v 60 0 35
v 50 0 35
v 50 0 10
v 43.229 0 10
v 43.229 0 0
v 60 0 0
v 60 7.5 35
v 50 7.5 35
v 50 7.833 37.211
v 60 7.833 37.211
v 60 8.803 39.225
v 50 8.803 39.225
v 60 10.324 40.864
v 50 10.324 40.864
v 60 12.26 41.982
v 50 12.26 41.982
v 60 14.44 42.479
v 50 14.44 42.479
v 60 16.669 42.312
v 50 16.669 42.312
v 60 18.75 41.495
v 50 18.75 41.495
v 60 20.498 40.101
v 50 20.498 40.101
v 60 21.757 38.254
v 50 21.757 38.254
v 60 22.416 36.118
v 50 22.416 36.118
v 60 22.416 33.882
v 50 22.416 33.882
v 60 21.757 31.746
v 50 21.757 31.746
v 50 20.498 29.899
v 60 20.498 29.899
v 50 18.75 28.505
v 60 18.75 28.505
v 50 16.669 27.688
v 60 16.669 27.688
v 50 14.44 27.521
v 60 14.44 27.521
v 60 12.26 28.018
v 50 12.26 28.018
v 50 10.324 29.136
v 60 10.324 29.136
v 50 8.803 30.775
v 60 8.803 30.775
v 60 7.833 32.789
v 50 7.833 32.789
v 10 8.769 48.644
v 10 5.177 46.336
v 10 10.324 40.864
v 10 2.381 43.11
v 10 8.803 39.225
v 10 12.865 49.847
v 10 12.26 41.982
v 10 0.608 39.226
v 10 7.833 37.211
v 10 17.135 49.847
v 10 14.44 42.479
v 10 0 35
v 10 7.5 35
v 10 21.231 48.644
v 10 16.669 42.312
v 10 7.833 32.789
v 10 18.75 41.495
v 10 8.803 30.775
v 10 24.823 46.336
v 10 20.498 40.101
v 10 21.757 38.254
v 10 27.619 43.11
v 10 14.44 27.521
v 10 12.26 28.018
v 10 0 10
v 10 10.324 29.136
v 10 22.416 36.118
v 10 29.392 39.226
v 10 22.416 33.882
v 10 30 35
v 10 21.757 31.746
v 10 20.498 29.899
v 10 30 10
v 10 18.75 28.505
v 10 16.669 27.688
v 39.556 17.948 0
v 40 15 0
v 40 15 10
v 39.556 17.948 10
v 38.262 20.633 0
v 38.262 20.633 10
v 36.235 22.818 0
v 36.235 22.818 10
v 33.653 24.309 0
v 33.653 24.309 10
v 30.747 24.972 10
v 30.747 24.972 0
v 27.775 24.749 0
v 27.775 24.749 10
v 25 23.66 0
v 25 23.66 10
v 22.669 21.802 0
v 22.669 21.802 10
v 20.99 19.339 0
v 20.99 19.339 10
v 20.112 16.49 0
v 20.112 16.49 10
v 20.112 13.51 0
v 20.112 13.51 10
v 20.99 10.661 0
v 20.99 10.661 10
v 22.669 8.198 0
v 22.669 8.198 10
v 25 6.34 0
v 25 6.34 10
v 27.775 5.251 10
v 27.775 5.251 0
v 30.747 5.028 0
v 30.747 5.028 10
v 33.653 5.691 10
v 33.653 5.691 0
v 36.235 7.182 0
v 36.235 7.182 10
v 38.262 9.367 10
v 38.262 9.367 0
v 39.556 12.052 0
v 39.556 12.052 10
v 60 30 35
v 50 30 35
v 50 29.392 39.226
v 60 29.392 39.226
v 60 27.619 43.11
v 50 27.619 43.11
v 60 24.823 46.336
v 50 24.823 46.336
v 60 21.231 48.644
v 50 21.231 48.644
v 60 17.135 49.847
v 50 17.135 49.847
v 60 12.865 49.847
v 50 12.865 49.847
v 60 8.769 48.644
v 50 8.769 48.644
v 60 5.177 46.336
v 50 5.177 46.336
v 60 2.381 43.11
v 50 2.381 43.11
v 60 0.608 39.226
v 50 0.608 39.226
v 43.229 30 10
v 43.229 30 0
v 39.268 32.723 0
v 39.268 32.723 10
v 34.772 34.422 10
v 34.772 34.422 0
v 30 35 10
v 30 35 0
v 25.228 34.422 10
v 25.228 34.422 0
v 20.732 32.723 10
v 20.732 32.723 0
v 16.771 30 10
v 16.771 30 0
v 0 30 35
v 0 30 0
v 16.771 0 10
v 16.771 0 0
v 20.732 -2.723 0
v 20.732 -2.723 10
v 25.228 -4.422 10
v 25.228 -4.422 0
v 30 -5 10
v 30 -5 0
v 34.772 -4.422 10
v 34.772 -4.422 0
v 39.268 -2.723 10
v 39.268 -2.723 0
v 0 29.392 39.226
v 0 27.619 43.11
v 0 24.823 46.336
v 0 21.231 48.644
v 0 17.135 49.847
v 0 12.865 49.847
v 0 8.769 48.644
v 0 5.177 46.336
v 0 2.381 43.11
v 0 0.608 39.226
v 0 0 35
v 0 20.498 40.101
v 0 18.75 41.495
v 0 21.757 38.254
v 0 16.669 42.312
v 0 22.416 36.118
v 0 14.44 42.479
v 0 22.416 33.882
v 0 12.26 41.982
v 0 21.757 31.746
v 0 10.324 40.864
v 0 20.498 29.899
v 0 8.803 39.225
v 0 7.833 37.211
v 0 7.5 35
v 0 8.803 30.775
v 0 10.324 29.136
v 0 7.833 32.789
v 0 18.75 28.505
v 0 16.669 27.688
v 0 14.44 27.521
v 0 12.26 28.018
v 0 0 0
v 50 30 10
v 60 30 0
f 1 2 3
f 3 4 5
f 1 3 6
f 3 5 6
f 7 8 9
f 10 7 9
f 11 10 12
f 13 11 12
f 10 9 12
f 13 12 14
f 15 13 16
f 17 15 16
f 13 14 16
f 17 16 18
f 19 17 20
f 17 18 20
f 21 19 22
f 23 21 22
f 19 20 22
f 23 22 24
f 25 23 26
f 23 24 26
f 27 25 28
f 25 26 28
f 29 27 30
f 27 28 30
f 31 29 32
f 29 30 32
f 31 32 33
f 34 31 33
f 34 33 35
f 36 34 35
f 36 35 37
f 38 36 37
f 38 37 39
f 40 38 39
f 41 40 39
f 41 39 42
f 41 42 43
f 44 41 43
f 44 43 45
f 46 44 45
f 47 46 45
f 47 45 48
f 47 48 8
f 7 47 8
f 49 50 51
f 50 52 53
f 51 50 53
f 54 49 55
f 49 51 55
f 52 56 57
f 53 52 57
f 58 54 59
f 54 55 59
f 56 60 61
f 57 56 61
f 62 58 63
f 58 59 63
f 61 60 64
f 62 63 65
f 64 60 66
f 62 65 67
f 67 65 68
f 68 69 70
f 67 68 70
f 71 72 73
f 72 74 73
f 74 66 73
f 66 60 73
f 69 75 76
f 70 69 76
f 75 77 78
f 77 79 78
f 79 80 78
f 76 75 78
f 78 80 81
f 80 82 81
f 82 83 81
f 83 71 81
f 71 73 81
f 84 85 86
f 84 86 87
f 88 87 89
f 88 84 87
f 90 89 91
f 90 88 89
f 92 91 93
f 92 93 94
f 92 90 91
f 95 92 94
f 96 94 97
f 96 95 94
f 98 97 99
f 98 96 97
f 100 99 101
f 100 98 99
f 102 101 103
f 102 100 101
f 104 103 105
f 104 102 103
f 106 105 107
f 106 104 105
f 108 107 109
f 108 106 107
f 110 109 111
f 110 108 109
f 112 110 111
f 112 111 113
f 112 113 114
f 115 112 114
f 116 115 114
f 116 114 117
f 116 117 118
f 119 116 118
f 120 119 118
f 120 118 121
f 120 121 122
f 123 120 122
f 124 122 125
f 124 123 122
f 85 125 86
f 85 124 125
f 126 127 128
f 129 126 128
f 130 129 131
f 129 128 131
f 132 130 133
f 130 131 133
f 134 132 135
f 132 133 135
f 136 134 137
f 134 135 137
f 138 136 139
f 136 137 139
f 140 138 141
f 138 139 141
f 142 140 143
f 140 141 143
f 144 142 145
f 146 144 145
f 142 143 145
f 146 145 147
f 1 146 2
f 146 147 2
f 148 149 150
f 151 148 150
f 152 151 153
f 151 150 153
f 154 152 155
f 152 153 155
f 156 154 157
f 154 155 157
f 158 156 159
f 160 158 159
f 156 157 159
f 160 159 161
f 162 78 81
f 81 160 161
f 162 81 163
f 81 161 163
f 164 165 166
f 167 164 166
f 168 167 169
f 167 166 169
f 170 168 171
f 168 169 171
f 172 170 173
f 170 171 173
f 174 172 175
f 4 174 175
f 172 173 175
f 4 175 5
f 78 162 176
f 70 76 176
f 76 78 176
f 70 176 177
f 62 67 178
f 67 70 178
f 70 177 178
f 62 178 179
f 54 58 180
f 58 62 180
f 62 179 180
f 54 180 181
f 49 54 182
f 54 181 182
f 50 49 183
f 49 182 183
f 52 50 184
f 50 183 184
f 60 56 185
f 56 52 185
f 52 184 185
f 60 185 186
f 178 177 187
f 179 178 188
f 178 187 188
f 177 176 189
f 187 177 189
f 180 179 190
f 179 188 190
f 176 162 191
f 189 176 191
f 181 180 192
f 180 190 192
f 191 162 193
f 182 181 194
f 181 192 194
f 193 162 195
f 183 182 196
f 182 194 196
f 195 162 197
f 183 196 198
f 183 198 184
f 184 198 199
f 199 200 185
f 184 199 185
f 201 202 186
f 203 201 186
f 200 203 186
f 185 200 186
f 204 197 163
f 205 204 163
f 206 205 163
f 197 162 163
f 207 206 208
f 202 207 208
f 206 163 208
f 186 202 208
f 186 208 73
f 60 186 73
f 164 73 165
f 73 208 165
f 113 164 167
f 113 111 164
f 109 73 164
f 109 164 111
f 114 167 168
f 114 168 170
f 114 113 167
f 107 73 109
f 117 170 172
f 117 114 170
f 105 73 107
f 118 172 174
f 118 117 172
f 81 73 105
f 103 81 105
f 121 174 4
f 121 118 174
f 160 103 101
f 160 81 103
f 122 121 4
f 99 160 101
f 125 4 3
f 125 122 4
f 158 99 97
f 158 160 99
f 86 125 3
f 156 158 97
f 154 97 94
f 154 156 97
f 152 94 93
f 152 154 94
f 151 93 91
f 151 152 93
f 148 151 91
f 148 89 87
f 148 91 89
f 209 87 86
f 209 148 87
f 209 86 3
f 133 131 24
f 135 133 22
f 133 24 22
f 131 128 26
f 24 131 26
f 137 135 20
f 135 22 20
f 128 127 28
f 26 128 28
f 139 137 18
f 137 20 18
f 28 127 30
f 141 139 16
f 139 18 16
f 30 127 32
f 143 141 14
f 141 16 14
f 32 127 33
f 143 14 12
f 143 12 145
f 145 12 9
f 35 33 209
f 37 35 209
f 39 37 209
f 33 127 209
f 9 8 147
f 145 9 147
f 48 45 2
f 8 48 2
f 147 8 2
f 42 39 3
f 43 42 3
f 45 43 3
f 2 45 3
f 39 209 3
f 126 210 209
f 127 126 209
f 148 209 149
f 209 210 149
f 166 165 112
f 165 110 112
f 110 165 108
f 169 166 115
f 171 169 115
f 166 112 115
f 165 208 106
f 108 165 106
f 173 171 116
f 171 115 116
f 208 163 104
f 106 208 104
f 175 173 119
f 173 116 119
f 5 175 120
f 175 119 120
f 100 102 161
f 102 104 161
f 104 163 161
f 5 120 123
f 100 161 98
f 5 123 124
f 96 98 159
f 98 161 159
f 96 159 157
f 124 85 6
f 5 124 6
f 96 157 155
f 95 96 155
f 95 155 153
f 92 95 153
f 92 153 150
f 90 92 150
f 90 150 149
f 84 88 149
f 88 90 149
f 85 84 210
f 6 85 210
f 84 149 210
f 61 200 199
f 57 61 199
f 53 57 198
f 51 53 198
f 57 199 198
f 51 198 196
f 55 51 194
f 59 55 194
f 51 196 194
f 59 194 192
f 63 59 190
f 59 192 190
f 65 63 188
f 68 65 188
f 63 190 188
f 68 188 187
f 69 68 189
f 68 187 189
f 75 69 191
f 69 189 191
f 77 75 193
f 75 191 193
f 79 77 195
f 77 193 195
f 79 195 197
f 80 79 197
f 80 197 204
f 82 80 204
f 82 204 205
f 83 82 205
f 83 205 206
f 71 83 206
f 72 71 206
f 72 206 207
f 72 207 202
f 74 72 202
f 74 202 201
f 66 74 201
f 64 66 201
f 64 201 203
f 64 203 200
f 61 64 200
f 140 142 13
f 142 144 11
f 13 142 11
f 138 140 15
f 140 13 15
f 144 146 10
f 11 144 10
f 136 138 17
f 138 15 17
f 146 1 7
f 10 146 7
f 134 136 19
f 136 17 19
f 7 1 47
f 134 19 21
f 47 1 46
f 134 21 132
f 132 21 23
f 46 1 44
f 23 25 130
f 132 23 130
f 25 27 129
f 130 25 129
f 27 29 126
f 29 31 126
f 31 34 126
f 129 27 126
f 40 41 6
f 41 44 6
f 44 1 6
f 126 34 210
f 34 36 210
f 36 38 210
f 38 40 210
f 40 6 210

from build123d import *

# Parameters (mm, degrees)
F0_R     = 10
F1_DEPTH = 10
F2_DEPTH = 50
F3_R     = 7.5
F4_DEPTH = 60.001


with BuildPart() as f1:
    # F0 (on Top) → F1 (new body)
    with BuildSketch(Plane.XY):
        Polygon((0, 30), (0, 0), (10, 0), (10, 15), (10, 30), align=None)
        with BuildLine():
            Line((10, 15), (10, 0))
            Line((10, 0), (16.7712434447, 0))
            ThreePointArc((16.7712434447, 0), (11.7712434447, 6.7712434447), (10, 15))
        make_face()
        with BuildLine():
            ThreePointArc((10, 15), (11.7712434447, 6.7712434447), (16.7712434447, 0))
            Line((16.7712434447, 0), (43.2287565553, 0))
            ThreePointArc((43.2287565553, 0), (48.2287565553, 6.7712434447), (50, 15))
            ThreePointArc((50, 15), (48.2287565553, 23.2287565553), (43.2287565553, 30))
            Line((43.2287565553, 30), (16.7712434447, 30))
            ThreePointArc((16.7712434447, 30), (11.7712434447, 23.2287565553), (10, 15))
        make_face()
        with Locations((30, 15)):
            Circle(F0_R, mode=Mode.SUBTRACT)
        with BuildLine():
            Line((43.2287565553, 0), (16.7712434447, 0))
            ThreePointArc((16.7712434447, 0), (30, -5), (43.2287565553, 0))
        make_face()
        with BuildLine():
            Line((10, 30), (10, 15))
            ThreePointArc((10, 15), (11.7712434447, 23.2287565553), (16.7712434447, 30))
            Line((16.7712434447, 30), (10, 30))
        make_face()
        with BuildLine():
            ThreePointArc((50, 15), (48.2287565553, 6.7712434447), (43.2287565553, 0))
            Line((43.2287565553, 0), (50, 0))
            Line((50, 0), (50, 15))
        make_face()
        with BuildLine():
            ThreePointArc((43.2287565553, 30), (30, 35), (16.7712434447, 30))
            Line((16.7712434447, 30), (43.2287565553, 30))
        make_face()
        Polygon((50, 15), (50, 0), (60, 0), (60, 30), (50, 30), align=None)
        with BuildLine():
            ThreePointArc((43.2287565553, 30), (48.2287565553, 23.2287565553), (50, 15))
            Line((50, 15), (50, 30))
            Line((50, 30), (43.2287565553, 30))
        make_face()
    extrude(amount=F1_DEPTH)

    # F0 (on Top) → F2 (join)
    with BuildSketch(Plane.XY):
        Polygon((0, 30), (0, 0), (10, 0), (10, 15), (10, 30), align=None)
        Polygon((50, 15), (50, 0), (60, 0), (60, 30), (50, 30), align=None)
    extrude(amount=F2_DEPTH)

    # F3 (on face) → F4 (cut, through all)
    with BuildSketch(Plane(origin=(0, 0, 0), x_dir=(0, -1, 0), z_dir=(-1, 0, 0))):
        with Locations((-15, 35)):
            Circle(F3_R)
        with BuildLine():
            Line((-30, 50), (-30, 35))
            ThreePointArc((-30, 35), (-25.6066017178, 45.6066017178), (-15, 50))
            Line((-15, 50), (-30, 50))
        make_face()
        with BuildLine():
            Line((0, 50), (-15, 50))
            ThreePointArc((-15, 50), (-4.3933982822, 45.6066017178), (0, 35))
            Line((0, 35), (0, 50))
        make_face()
    extrude(amount=-F4_DEPTH, mode=Mode.SUBTRACT)


solid = f1.part
